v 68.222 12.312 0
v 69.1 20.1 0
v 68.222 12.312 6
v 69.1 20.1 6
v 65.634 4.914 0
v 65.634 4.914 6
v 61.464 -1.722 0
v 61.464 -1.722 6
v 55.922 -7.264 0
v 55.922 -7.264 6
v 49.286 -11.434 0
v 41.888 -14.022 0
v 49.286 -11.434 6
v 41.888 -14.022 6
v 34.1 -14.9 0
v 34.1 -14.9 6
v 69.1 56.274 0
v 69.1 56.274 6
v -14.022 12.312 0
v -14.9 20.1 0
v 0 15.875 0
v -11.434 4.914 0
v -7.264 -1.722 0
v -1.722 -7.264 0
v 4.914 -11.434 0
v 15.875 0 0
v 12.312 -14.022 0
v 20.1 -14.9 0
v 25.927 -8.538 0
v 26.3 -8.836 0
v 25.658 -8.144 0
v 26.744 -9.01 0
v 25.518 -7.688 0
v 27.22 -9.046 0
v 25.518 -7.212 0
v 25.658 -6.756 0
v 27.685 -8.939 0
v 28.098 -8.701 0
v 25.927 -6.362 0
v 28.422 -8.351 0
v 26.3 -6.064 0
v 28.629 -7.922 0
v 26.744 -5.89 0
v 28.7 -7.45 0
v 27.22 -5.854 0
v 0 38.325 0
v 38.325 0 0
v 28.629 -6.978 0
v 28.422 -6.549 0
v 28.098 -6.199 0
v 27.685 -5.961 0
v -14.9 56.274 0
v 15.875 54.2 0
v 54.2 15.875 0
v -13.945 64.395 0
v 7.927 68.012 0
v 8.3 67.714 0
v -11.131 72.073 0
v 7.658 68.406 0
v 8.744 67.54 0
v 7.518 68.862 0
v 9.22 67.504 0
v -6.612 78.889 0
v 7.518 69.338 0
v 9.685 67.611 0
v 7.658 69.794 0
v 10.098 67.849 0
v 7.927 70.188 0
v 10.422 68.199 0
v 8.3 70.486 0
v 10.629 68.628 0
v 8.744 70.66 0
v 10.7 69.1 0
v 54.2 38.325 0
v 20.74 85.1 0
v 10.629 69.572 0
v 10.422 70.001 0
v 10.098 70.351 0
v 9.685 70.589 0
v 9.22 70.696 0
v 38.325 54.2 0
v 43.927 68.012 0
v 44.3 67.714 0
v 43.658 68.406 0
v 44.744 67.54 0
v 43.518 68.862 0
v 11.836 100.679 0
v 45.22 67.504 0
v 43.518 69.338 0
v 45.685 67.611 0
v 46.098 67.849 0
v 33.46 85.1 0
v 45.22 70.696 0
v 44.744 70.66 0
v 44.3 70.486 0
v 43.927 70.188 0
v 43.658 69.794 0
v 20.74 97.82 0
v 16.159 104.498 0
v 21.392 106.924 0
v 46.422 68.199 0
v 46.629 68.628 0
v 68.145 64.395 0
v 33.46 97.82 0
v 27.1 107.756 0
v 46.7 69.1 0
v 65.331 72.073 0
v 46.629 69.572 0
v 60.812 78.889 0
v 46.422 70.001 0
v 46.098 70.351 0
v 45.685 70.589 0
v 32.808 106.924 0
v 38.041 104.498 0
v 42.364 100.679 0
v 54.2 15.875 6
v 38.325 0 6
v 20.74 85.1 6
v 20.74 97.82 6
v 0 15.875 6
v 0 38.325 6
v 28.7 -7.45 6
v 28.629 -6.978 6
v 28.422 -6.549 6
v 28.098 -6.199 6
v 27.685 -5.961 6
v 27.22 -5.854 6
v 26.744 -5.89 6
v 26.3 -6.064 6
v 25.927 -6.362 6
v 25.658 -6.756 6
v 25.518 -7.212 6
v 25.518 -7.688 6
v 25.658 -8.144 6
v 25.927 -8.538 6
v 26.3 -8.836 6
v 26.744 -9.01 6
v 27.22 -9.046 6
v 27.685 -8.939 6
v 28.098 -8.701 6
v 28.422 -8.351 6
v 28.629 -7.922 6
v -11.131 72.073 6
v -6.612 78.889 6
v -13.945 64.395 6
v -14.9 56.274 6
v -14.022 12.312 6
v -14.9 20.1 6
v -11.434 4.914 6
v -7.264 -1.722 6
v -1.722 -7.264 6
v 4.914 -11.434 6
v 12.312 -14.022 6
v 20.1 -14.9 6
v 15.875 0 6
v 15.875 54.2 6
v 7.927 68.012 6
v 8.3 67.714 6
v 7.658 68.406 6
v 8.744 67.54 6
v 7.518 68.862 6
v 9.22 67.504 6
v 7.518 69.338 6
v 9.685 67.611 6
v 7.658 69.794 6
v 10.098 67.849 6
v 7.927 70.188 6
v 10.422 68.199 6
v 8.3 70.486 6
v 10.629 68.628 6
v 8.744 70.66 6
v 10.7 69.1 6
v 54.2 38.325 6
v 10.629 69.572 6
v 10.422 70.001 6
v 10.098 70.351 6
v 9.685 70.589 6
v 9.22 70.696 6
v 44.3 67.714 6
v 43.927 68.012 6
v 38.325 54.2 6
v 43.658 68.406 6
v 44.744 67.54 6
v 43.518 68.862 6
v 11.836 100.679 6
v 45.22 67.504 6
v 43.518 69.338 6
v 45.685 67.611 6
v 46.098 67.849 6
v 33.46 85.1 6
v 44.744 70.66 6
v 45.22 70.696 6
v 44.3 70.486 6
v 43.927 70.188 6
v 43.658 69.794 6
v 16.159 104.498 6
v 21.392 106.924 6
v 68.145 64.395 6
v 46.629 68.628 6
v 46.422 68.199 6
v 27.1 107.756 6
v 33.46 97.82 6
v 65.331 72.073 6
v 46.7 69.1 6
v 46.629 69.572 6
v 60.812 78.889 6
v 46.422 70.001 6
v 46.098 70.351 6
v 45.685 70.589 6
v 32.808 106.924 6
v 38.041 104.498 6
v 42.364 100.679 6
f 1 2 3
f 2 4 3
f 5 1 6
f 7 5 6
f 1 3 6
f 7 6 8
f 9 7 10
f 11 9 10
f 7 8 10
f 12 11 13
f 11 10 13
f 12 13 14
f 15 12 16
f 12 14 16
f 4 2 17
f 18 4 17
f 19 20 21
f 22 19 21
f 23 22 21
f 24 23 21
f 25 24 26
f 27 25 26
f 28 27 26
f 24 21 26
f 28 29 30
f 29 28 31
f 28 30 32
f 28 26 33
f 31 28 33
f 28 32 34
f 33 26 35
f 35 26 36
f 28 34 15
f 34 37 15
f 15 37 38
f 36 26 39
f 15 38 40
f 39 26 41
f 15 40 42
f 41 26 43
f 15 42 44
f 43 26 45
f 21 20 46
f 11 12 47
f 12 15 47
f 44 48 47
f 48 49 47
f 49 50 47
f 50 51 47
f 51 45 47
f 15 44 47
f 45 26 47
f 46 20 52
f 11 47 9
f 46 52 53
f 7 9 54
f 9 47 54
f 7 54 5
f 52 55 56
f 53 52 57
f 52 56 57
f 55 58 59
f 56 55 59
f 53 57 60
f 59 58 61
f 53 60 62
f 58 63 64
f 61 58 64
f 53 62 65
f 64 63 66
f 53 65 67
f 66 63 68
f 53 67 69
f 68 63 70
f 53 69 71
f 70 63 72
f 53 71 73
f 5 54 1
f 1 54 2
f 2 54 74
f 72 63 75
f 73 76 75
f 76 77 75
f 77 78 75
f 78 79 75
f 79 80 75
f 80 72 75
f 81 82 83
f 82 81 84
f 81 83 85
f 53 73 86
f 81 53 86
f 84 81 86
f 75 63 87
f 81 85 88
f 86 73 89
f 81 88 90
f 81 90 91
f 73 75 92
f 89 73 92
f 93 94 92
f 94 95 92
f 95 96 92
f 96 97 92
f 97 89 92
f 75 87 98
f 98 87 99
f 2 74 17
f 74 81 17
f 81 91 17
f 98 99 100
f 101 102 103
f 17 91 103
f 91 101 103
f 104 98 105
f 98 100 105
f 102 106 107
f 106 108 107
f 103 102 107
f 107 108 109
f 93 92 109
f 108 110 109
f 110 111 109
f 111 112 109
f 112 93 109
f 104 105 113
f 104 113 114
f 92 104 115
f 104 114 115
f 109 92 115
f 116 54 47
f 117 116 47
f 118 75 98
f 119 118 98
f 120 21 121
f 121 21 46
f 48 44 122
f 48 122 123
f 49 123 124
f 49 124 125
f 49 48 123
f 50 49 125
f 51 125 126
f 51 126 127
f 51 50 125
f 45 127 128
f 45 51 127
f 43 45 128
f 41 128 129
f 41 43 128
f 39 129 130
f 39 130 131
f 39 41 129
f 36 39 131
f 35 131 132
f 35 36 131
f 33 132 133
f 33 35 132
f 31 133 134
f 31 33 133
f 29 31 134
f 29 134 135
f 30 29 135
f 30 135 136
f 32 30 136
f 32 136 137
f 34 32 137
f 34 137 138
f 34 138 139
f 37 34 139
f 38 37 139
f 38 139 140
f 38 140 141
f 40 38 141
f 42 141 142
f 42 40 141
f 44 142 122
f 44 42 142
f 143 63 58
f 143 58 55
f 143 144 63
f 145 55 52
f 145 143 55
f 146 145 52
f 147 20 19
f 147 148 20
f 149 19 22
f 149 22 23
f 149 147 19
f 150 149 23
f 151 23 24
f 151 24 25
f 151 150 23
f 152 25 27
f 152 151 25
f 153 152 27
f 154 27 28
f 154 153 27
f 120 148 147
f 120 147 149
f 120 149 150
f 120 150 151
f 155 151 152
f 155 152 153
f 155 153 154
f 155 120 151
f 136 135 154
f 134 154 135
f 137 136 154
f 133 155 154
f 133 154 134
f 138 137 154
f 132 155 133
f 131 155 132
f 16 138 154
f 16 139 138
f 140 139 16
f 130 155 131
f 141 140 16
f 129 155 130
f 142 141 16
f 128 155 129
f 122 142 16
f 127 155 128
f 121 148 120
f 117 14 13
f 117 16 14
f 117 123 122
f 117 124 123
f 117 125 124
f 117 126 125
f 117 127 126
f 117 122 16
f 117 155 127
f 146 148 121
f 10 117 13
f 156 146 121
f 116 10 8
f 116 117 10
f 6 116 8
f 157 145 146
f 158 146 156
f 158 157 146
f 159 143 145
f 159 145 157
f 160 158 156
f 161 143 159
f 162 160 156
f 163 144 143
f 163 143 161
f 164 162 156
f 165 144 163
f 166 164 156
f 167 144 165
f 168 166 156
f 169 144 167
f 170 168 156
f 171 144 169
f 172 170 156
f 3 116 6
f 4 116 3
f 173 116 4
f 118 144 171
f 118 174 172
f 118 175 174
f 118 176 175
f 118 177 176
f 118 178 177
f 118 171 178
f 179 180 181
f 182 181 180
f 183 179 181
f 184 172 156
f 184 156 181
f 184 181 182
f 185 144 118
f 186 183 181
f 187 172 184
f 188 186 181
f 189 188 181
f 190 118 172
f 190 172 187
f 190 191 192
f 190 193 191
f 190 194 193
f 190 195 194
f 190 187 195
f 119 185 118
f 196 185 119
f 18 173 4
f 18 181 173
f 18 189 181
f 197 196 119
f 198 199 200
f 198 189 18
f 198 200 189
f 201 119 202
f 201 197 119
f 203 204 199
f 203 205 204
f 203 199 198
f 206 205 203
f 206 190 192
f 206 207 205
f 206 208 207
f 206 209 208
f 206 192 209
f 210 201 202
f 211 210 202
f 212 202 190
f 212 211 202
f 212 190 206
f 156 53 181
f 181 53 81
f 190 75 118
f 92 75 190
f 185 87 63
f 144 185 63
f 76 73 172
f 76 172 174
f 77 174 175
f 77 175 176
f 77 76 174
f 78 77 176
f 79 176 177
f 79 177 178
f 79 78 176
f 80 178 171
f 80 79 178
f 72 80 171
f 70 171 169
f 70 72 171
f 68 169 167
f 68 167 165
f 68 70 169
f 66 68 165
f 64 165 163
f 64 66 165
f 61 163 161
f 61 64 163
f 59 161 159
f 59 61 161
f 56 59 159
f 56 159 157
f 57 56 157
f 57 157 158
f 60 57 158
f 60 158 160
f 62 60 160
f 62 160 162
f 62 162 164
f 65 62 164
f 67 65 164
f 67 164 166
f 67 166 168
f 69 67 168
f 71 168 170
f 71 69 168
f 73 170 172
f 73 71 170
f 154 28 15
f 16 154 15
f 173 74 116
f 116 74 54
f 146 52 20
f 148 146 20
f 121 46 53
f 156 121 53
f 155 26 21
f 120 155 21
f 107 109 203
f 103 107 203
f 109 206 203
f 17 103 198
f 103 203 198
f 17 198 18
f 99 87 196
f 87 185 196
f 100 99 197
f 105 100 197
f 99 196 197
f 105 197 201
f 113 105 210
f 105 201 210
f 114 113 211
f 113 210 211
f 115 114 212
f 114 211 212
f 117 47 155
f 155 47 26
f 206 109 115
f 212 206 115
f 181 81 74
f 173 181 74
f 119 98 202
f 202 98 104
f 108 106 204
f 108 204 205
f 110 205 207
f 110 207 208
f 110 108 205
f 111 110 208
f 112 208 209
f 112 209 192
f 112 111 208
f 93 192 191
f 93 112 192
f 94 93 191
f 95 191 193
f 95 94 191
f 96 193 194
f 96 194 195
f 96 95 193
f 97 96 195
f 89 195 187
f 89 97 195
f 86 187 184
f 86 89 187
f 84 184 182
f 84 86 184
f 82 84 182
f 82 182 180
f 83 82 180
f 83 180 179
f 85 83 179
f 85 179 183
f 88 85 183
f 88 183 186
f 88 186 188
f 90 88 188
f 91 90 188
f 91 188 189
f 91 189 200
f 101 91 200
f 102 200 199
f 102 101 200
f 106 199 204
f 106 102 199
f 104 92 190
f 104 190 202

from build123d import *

# Parameters (mm, degrees)
F0_R     = 1.6
F0_W     = 12.72
F0_H     = 12.72
F1_DEPTH = 6
F2_R     = 35
F3_R     = 20


with BuildPart() as f1:
    # F0 (on Top) → F1 (new body)
    with BuildSketch(Plane.XY):
        Polygon((27.1, 118.708467), (-14.9, 69.1), (-14.9, -14.9), (69.1, -14.9), (69.1, 69.1), align=None)
        with Locations((27.1, -7.45)):
            Circle(F0_R, mode=Mode.SUBTRACT)
        Polygon((0, 15.874812), (0, 38.325188), (15.874812, 54.2), (38.325188, 54.2), (54.2, 38.325188), (54.2, 15.874812), (38.325188, 0), (15.874812, 0), align=None, mode=Mode.SUBTRACT)
        with Locations((9.1, 69.1)):
            Circle(F0_R, mode=Mode.SUBTRACT)
        with Locations((45.1, 69.1)):
            Circle(F0_R, mode=Mode.SUBTRACT)
        with Locations((27.1, 91.46)):
            Rectangle(F0_W, F0_H, mode=Mode.SUBTRACT)
    extrude(amount=F1_DEPTH)

    # F2
    f2_edges = [f1.edges().sort_by_distance(p)[0] for p in [
        (69.1, -14.9, 3),
        (-14.9, -14.9, 3),
        (-14.9, 69.1, 3),
        (69.1, 69.1, 3),
    ]]
    fillet(f2_edges, radius=F2_R)

    # F3
    f3_edges = [f1.edges().sort_by_distance(p)[0] for p in [
        (27.1, 118.708467, 3),
    ]]
    fillet(f3_edges, radius=F3_R)


solid = f1.part
